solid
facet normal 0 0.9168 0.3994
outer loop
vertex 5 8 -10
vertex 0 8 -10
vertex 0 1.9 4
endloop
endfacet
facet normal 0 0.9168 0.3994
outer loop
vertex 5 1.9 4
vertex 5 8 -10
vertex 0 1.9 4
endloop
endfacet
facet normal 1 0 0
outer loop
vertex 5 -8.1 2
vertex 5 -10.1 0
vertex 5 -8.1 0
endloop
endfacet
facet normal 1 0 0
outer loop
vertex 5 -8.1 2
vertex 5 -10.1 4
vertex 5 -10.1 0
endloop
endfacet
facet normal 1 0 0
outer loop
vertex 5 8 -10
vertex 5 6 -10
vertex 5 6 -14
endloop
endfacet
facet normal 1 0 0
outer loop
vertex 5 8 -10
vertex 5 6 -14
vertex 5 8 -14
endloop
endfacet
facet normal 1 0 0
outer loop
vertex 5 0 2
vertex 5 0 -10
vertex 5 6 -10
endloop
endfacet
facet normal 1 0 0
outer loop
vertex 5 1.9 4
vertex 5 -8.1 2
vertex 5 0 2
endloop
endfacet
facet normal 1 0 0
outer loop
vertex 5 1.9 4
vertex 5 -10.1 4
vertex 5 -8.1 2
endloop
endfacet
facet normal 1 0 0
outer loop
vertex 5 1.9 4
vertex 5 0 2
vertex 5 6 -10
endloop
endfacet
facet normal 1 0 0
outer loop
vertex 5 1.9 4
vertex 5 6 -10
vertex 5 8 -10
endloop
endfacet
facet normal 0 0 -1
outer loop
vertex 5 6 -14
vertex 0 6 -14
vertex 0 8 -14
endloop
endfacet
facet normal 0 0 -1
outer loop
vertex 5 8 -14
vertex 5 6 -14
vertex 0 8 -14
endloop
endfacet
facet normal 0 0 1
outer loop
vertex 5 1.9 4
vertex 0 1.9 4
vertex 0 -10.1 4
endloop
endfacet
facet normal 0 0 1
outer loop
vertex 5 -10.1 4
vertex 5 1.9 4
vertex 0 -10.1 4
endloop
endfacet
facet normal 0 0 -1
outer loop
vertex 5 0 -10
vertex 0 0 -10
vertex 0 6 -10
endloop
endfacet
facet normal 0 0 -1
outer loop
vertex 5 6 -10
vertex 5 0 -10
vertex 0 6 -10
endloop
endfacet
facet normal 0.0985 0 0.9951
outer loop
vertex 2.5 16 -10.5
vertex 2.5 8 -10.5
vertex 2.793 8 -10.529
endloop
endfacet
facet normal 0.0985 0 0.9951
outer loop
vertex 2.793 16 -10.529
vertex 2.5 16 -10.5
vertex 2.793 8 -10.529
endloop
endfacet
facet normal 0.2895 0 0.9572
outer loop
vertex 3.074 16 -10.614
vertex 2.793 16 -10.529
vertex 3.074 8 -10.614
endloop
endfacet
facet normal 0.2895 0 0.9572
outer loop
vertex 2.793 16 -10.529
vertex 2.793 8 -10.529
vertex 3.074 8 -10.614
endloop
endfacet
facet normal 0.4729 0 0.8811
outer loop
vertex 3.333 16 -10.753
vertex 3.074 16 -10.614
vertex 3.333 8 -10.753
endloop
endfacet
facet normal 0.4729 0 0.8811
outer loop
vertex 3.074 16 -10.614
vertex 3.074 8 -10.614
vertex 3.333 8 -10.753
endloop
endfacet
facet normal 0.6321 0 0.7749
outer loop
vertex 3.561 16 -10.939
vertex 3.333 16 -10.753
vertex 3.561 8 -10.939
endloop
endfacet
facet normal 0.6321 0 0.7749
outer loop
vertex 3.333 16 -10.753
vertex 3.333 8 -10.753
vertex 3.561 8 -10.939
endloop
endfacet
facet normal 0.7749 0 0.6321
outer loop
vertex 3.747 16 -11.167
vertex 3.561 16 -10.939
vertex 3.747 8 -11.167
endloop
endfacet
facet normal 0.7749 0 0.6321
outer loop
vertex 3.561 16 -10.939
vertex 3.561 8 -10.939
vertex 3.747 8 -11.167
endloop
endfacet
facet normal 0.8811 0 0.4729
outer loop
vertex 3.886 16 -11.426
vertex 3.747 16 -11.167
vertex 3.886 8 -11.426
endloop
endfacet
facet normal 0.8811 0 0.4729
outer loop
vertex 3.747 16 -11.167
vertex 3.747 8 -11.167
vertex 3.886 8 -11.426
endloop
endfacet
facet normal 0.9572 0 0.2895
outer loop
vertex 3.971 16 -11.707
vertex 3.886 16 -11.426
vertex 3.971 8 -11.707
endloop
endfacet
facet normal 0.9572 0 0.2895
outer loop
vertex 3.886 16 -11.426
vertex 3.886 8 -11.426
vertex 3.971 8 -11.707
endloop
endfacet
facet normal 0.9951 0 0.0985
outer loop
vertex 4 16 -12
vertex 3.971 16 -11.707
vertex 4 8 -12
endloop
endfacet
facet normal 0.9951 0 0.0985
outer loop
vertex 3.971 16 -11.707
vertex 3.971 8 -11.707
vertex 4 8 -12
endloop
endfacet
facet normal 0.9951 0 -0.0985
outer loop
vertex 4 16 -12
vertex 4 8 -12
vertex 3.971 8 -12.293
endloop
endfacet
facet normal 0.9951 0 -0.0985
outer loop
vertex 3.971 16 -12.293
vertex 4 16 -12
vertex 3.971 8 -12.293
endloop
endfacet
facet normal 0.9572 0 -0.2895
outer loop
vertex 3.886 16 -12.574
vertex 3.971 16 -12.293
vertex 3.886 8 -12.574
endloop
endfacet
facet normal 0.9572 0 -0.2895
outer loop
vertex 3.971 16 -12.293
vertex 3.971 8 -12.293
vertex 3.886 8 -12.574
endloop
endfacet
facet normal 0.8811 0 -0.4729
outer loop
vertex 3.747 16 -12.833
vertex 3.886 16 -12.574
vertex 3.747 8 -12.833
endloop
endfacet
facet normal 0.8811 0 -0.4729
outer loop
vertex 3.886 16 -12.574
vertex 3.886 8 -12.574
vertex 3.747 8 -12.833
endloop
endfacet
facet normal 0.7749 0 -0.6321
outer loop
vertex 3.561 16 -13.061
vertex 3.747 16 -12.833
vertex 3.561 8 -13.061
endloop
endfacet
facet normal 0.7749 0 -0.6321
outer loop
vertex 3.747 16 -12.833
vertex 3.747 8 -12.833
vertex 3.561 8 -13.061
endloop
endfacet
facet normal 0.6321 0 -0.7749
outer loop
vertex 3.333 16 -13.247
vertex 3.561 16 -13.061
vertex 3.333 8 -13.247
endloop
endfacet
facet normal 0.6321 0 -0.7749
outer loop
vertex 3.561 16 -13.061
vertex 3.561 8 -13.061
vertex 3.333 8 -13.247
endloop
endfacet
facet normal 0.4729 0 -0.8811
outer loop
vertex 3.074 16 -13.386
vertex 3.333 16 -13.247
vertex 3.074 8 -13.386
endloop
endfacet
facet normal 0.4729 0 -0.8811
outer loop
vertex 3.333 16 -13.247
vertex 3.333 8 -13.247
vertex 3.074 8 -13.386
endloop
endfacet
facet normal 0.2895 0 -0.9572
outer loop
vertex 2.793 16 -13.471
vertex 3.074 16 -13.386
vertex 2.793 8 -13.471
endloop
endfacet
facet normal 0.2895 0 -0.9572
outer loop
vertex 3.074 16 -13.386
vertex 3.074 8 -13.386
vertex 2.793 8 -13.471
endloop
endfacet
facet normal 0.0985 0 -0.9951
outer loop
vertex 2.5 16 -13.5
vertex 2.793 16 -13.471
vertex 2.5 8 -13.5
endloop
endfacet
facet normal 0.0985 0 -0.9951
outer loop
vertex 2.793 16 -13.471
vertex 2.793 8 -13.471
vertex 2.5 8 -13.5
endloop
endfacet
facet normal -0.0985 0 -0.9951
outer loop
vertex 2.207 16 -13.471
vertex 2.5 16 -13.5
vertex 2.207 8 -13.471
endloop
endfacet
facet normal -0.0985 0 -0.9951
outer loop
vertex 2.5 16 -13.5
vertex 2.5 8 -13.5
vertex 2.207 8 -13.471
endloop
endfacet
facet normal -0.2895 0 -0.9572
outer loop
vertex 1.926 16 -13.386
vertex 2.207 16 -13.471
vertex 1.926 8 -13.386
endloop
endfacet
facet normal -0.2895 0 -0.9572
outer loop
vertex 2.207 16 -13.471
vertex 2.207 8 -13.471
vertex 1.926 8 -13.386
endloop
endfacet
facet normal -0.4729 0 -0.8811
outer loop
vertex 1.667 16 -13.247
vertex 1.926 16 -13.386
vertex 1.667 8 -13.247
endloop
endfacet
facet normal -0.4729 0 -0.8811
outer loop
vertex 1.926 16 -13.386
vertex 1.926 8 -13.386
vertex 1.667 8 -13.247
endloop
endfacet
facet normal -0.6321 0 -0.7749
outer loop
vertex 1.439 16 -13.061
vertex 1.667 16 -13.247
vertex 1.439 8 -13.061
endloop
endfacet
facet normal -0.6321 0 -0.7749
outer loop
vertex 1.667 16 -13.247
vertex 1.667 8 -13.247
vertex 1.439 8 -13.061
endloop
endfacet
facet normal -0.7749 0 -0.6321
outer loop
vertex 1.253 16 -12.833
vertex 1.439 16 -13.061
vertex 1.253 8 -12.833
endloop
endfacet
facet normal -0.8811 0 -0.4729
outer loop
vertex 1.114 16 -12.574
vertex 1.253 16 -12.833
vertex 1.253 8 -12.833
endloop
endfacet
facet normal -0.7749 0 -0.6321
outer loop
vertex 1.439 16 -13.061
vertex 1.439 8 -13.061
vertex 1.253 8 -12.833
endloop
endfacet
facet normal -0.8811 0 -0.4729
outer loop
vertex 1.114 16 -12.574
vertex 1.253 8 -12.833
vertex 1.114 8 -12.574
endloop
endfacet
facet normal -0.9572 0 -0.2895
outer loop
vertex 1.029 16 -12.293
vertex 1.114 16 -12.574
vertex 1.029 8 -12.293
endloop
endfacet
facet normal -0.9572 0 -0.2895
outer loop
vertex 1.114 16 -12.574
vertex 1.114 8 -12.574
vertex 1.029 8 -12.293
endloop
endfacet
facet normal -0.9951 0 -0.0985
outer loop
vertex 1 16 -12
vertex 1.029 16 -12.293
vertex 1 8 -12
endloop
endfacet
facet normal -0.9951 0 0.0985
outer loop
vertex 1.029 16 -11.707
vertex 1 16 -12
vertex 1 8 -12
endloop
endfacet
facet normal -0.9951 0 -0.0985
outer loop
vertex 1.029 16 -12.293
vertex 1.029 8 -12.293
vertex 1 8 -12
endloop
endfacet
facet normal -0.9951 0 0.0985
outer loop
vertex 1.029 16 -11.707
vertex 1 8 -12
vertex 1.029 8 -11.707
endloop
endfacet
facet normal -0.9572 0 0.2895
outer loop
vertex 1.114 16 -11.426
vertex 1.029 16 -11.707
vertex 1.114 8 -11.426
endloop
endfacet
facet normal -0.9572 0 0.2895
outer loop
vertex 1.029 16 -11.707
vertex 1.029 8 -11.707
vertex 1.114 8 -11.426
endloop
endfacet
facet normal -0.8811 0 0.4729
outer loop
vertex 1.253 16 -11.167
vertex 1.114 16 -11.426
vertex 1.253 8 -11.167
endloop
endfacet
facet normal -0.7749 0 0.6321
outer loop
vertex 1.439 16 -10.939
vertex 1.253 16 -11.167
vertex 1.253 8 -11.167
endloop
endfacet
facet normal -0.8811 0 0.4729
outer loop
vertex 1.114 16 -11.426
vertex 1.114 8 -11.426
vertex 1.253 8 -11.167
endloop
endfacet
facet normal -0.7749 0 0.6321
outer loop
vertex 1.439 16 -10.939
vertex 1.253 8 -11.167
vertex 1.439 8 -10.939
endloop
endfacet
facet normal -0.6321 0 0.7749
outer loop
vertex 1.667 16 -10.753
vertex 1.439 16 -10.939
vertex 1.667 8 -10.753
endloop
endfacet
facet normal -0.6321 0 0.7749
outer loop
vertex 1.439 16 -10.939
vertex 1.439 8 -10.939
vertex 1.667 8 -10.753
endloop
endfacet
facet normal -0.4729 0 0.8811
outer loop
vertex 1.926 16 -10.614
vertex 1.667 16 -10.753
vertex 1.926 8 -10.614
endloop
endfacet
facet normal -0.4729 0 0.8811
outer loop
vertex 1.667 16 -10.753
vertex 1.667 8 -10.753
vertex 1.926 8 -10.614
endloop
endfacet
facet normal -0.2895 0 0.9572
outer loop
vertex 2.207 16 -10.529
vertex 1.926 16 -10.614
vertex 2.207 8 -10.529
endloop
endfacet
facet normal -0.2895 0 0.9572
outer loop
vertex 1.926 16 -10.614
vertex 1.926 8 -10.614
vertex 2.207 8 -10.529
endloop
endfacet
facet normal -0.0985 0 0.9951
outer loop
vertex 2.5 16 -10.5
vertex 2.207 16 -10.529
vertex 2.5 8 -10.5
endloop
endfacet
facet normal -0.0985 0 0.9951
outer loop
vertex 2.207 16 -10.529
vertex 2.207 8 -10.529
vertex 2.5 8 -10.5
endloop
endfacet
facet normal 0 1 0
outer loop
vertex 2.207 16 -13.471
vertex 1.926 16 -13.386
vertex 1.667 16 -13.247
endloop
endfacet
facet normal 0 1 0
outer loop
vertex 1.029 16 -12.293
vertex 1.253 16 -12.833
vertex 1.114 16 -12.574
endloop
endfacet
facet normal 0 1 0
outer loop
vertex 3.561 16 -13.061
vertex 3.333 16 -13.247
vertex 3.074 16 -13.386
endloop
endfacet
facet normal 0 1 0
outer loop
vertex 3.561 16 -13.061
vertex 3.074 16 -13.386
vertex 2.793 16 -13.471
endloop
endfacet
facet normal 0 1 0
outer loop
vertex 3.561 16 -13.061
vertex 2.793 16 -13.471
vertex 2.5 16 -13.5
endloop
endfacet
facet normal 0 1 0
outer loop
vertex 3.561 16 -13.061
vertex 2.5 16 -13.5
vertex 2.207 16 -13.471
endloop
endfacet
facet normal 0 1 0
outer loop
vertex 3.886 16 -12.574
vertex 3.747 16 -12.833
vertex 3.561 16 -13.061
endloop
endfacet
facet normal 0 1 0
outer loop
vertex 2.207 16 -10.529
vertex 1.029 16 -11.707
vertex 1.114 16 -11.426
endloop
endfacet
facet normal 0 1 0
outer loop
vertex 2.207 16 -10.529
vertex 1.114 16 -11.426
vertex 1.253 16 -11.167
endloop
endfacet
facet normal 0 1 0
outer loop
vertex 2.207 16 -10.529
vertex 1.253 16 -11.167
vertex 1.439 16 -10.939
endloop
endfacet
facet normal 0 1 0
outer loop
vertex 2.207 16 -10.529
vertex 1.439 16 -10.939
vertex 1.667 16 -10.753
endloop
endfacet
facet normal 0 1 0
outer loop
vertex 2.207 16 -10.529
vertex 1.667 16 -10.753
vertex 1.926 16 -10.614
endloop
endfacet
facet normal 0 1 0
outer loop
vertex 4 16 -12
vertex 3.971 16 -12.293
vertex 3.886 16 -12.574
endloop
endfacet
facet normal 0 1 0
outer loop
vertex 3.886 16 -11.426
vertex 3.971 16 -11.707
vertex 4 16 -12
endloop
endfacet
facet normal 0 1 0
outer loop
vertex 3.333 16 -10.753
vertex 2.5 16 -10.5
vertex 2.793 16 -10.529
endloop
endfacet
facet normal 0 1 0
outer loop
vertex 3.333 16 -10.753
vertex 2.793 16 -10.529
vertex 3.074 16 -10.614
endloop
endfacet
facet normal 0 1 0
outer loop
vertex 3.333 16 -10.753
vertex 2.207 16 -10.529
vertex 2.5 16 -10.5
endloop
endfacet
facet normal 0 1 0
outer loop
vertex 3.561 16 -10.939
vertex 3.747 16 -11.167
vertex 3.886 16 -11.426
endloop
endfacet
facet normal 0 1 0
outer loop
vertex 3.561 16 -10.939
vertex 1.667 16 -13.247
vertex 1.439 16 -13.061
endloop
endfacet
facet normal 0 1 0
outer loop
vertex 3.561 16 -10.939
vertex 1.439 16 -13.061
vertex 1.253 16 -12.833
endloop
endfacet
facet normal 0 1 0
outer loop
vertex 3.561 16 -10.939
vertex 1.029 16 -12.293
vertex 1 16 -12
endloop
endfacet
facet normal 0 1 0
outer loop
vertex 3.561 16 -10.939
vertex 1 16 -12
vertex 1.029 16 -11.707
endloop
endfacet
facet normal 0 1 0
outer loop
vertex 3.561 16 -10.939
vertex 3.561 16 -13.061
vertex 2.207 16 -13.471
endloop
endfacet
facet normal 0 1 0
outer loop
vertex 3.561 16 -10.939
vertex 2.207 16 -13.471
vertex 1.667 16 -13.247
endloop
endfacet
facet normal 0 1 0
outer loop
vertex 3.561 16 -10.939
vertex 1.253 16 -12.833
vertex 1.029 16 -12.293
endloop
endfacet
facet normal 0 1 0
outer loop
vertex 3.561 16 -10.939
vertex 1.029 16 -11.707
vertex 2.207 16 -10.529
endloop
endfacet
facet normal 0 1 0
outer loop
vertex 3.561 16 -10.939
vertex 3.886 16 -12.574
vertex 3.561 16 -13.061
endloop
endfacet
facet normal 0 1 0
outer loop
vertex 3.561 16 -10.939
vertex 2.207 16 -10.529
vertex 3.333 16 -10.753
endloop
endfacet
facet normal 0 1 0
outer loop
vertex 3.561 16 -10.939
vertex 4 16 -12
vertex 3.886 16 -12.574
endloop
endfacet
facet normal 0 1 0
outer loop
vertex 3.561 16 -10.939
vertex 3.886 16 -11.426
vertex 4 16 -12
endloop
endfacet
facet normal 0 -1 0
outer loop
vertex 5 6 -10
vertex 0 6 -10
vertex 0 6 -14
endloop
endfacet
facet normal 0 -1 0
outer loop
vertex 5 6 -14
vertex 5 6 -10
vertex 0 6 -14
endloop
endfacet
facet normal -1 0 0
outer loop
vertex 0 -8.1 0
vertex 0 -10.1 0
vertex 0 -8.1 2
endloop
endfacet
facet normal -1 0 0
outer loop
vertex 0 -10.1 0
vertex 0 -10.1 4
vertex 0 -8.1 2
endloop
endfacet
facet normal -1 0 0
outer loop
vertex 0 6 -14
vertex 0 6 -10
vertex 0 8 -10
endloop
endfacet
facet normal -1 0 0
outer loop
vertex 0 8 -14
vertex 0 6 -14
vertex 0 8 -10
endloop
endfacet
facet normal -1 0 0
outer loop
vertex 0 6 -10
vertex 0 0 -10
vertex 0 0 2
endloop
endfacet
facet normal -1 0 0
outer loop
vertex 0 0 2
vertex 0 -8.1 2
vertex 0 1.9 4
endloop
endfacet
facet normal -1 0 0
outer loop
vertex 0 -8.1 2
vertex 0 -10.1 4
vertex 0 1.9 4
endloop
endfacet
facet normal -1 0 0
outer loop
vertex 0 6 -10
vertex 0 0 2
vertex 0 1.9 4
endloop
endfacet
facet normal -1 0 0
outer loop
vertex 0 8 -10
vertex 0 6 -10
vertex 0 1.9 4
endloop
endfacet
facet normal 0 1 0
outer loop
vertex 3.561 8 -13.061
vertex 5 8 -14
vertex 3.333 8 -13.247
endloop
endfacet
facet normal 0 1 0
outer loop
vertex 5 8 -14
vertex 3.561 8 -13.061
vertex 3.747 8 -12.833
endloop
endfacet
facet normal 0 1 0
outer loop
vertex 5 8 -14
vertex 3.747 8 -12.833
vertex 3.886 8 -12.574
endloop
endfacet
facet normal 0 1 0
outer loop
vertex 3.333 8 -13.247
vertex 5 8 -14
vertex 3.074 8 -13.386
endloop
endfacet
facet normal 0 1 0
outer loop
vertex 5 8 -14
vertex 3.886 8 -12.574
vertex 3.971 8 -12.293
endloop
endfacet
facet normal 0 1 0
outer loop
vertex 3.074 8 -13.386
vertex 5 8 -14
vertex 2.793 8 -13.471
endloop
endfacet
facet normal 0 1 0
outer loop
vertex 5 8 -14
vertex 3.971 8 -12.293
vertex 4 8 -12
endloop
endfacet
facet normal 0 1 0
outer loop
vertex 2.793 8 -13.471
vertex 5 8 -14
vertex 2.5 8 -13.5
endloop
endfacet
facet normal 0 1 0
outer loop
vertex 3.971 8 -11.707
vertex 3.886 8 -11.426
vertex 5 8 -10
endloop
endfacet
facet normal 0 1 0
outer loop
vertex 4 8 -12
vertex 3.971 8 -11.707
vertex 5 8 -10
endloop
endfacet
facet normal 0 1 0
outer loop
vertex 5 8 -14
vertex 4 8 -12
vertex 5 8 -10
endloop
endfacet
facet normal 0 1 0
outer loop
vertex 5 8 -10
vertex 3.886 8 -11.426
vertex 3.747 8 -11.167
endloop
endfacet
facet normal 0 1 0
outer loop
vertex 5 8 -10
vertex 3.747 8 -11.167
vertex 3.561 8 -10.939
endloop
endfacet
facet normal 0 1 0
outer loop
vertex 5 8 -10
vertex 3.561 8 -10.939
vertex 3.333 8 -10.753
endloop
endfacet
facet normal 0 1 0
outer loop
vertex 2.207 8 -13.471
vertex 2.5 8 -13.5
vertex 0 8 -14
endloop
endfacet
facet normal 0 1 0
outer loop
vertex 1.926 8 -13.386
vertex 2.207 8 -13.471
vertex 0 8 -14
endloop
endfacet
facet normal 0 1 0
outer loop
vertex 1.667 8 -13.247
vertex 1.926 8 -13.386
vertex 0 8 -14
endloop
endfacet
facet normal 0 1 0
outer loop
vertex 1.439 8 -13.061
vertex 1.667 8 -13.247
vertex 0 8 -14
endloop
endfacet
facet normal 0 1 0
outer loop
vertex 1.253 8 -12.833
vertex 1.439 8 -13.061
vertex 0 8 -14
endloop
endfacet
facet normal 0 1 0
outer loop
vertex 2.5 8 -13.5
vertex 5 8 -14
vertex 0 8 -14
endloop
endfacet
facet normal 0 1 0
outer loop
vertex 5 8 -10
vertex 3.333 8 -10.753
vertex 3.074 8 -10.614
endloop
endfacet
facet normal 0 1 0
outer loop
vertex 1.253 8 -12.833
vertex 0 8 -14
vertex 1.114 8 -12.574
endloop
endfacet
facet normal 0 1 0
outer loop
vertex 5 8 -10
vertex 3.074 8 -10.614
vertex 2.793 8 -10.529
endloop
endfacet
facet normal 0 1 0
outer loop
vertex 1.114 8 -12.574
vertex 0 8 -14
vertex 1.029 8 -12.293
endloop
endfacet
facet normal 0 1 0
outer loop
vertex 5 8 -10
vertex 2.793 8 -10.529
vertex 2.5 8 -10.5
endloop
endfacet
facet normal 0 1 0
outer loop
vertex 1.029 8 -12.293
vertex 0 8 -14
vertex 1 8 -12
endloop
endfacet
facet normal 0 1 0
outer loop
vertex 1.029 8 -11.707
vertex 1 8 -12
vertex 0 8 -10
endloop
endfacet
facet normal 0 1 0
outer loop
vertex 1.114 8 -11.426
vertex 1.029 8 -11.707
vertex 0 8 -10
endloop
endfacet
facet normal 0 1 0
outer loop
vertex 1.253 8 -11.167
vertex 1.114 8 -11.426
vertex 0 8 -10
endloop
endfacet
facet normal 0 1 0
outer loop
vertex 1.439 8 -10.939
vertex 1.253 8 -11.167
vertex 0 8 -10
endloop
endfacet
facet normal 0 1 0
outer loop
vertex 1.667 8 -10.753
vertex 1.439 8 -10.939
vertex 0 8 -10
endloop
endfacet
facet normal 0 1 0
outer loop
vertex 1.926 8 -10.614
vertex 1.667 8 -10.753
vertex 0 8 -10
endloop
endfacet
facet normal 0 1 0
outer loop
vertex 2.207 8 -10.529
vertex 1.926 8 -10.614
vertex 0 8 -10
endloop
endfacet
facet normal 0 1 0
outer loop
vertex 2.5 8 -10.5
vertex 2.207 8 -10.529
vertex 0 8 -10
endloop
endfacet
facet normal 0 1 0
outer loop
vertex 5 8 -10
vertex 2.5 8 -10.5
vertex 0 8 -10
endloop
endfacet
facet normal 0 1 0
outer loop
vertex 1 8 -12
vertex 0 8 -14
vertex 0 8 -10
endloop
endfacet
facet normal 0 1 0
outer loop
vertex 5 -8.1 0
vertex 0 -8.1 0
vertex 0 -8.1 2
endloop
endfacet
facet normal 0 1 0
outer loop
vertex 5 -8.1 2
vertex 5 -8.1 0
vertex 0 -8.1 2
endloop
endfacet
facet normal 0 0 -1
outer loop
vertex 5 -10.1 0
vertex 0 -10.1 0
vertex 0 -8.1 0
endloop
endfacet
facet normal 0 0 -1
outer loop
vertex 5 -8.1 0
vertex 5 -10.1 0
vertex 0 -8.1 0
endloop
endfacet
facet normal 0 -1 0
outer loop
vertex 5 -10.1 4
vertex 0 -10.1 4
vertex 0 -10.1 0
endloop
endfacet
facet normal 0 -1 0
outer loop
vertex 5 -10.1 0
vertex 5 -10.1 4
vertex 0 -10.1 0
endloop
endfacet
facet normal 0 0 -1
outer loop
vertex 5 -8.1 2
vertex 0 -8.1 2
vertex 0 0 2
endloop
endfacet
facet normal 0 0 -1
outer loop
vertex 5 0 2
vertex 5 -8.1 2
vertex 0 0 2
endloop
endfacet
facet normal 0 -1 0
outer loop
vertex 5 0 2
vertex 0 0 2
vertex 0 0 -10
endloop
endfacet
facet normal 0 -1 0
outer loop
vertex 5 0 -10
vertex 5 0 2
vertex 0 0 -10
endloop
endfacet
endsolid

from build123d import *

# Parameters (mm, degrees)
PAD_DEPTH    = 5
SKETCH001_R  = 1.5
PAD001_DEPTH = 8


with BuildPart() as part:
    # Sketch → Pad (new body)
    with BuildSketch(Plane.YZ):
        Polygon((-10.1, 0), (-8.1, 0), (-8.1, 2), (0, 2), (0, -10), (6, -10), (6, -14), (8, -14), (8, -10), (1.9, 4), (-10.1, 4), align=None)
    extrude(amount=PAD_DEPTH)

    # Sketch001 (on Face10 of Pad) → Pad001 (join)
    with BuildSketch(Plane.ZX.offset(8)):
        with Locations((-12, 2.5)):
            Circle(SKETCH001_R)
    extrude(amount=PAD001_DEPTH)


solid = part.part
